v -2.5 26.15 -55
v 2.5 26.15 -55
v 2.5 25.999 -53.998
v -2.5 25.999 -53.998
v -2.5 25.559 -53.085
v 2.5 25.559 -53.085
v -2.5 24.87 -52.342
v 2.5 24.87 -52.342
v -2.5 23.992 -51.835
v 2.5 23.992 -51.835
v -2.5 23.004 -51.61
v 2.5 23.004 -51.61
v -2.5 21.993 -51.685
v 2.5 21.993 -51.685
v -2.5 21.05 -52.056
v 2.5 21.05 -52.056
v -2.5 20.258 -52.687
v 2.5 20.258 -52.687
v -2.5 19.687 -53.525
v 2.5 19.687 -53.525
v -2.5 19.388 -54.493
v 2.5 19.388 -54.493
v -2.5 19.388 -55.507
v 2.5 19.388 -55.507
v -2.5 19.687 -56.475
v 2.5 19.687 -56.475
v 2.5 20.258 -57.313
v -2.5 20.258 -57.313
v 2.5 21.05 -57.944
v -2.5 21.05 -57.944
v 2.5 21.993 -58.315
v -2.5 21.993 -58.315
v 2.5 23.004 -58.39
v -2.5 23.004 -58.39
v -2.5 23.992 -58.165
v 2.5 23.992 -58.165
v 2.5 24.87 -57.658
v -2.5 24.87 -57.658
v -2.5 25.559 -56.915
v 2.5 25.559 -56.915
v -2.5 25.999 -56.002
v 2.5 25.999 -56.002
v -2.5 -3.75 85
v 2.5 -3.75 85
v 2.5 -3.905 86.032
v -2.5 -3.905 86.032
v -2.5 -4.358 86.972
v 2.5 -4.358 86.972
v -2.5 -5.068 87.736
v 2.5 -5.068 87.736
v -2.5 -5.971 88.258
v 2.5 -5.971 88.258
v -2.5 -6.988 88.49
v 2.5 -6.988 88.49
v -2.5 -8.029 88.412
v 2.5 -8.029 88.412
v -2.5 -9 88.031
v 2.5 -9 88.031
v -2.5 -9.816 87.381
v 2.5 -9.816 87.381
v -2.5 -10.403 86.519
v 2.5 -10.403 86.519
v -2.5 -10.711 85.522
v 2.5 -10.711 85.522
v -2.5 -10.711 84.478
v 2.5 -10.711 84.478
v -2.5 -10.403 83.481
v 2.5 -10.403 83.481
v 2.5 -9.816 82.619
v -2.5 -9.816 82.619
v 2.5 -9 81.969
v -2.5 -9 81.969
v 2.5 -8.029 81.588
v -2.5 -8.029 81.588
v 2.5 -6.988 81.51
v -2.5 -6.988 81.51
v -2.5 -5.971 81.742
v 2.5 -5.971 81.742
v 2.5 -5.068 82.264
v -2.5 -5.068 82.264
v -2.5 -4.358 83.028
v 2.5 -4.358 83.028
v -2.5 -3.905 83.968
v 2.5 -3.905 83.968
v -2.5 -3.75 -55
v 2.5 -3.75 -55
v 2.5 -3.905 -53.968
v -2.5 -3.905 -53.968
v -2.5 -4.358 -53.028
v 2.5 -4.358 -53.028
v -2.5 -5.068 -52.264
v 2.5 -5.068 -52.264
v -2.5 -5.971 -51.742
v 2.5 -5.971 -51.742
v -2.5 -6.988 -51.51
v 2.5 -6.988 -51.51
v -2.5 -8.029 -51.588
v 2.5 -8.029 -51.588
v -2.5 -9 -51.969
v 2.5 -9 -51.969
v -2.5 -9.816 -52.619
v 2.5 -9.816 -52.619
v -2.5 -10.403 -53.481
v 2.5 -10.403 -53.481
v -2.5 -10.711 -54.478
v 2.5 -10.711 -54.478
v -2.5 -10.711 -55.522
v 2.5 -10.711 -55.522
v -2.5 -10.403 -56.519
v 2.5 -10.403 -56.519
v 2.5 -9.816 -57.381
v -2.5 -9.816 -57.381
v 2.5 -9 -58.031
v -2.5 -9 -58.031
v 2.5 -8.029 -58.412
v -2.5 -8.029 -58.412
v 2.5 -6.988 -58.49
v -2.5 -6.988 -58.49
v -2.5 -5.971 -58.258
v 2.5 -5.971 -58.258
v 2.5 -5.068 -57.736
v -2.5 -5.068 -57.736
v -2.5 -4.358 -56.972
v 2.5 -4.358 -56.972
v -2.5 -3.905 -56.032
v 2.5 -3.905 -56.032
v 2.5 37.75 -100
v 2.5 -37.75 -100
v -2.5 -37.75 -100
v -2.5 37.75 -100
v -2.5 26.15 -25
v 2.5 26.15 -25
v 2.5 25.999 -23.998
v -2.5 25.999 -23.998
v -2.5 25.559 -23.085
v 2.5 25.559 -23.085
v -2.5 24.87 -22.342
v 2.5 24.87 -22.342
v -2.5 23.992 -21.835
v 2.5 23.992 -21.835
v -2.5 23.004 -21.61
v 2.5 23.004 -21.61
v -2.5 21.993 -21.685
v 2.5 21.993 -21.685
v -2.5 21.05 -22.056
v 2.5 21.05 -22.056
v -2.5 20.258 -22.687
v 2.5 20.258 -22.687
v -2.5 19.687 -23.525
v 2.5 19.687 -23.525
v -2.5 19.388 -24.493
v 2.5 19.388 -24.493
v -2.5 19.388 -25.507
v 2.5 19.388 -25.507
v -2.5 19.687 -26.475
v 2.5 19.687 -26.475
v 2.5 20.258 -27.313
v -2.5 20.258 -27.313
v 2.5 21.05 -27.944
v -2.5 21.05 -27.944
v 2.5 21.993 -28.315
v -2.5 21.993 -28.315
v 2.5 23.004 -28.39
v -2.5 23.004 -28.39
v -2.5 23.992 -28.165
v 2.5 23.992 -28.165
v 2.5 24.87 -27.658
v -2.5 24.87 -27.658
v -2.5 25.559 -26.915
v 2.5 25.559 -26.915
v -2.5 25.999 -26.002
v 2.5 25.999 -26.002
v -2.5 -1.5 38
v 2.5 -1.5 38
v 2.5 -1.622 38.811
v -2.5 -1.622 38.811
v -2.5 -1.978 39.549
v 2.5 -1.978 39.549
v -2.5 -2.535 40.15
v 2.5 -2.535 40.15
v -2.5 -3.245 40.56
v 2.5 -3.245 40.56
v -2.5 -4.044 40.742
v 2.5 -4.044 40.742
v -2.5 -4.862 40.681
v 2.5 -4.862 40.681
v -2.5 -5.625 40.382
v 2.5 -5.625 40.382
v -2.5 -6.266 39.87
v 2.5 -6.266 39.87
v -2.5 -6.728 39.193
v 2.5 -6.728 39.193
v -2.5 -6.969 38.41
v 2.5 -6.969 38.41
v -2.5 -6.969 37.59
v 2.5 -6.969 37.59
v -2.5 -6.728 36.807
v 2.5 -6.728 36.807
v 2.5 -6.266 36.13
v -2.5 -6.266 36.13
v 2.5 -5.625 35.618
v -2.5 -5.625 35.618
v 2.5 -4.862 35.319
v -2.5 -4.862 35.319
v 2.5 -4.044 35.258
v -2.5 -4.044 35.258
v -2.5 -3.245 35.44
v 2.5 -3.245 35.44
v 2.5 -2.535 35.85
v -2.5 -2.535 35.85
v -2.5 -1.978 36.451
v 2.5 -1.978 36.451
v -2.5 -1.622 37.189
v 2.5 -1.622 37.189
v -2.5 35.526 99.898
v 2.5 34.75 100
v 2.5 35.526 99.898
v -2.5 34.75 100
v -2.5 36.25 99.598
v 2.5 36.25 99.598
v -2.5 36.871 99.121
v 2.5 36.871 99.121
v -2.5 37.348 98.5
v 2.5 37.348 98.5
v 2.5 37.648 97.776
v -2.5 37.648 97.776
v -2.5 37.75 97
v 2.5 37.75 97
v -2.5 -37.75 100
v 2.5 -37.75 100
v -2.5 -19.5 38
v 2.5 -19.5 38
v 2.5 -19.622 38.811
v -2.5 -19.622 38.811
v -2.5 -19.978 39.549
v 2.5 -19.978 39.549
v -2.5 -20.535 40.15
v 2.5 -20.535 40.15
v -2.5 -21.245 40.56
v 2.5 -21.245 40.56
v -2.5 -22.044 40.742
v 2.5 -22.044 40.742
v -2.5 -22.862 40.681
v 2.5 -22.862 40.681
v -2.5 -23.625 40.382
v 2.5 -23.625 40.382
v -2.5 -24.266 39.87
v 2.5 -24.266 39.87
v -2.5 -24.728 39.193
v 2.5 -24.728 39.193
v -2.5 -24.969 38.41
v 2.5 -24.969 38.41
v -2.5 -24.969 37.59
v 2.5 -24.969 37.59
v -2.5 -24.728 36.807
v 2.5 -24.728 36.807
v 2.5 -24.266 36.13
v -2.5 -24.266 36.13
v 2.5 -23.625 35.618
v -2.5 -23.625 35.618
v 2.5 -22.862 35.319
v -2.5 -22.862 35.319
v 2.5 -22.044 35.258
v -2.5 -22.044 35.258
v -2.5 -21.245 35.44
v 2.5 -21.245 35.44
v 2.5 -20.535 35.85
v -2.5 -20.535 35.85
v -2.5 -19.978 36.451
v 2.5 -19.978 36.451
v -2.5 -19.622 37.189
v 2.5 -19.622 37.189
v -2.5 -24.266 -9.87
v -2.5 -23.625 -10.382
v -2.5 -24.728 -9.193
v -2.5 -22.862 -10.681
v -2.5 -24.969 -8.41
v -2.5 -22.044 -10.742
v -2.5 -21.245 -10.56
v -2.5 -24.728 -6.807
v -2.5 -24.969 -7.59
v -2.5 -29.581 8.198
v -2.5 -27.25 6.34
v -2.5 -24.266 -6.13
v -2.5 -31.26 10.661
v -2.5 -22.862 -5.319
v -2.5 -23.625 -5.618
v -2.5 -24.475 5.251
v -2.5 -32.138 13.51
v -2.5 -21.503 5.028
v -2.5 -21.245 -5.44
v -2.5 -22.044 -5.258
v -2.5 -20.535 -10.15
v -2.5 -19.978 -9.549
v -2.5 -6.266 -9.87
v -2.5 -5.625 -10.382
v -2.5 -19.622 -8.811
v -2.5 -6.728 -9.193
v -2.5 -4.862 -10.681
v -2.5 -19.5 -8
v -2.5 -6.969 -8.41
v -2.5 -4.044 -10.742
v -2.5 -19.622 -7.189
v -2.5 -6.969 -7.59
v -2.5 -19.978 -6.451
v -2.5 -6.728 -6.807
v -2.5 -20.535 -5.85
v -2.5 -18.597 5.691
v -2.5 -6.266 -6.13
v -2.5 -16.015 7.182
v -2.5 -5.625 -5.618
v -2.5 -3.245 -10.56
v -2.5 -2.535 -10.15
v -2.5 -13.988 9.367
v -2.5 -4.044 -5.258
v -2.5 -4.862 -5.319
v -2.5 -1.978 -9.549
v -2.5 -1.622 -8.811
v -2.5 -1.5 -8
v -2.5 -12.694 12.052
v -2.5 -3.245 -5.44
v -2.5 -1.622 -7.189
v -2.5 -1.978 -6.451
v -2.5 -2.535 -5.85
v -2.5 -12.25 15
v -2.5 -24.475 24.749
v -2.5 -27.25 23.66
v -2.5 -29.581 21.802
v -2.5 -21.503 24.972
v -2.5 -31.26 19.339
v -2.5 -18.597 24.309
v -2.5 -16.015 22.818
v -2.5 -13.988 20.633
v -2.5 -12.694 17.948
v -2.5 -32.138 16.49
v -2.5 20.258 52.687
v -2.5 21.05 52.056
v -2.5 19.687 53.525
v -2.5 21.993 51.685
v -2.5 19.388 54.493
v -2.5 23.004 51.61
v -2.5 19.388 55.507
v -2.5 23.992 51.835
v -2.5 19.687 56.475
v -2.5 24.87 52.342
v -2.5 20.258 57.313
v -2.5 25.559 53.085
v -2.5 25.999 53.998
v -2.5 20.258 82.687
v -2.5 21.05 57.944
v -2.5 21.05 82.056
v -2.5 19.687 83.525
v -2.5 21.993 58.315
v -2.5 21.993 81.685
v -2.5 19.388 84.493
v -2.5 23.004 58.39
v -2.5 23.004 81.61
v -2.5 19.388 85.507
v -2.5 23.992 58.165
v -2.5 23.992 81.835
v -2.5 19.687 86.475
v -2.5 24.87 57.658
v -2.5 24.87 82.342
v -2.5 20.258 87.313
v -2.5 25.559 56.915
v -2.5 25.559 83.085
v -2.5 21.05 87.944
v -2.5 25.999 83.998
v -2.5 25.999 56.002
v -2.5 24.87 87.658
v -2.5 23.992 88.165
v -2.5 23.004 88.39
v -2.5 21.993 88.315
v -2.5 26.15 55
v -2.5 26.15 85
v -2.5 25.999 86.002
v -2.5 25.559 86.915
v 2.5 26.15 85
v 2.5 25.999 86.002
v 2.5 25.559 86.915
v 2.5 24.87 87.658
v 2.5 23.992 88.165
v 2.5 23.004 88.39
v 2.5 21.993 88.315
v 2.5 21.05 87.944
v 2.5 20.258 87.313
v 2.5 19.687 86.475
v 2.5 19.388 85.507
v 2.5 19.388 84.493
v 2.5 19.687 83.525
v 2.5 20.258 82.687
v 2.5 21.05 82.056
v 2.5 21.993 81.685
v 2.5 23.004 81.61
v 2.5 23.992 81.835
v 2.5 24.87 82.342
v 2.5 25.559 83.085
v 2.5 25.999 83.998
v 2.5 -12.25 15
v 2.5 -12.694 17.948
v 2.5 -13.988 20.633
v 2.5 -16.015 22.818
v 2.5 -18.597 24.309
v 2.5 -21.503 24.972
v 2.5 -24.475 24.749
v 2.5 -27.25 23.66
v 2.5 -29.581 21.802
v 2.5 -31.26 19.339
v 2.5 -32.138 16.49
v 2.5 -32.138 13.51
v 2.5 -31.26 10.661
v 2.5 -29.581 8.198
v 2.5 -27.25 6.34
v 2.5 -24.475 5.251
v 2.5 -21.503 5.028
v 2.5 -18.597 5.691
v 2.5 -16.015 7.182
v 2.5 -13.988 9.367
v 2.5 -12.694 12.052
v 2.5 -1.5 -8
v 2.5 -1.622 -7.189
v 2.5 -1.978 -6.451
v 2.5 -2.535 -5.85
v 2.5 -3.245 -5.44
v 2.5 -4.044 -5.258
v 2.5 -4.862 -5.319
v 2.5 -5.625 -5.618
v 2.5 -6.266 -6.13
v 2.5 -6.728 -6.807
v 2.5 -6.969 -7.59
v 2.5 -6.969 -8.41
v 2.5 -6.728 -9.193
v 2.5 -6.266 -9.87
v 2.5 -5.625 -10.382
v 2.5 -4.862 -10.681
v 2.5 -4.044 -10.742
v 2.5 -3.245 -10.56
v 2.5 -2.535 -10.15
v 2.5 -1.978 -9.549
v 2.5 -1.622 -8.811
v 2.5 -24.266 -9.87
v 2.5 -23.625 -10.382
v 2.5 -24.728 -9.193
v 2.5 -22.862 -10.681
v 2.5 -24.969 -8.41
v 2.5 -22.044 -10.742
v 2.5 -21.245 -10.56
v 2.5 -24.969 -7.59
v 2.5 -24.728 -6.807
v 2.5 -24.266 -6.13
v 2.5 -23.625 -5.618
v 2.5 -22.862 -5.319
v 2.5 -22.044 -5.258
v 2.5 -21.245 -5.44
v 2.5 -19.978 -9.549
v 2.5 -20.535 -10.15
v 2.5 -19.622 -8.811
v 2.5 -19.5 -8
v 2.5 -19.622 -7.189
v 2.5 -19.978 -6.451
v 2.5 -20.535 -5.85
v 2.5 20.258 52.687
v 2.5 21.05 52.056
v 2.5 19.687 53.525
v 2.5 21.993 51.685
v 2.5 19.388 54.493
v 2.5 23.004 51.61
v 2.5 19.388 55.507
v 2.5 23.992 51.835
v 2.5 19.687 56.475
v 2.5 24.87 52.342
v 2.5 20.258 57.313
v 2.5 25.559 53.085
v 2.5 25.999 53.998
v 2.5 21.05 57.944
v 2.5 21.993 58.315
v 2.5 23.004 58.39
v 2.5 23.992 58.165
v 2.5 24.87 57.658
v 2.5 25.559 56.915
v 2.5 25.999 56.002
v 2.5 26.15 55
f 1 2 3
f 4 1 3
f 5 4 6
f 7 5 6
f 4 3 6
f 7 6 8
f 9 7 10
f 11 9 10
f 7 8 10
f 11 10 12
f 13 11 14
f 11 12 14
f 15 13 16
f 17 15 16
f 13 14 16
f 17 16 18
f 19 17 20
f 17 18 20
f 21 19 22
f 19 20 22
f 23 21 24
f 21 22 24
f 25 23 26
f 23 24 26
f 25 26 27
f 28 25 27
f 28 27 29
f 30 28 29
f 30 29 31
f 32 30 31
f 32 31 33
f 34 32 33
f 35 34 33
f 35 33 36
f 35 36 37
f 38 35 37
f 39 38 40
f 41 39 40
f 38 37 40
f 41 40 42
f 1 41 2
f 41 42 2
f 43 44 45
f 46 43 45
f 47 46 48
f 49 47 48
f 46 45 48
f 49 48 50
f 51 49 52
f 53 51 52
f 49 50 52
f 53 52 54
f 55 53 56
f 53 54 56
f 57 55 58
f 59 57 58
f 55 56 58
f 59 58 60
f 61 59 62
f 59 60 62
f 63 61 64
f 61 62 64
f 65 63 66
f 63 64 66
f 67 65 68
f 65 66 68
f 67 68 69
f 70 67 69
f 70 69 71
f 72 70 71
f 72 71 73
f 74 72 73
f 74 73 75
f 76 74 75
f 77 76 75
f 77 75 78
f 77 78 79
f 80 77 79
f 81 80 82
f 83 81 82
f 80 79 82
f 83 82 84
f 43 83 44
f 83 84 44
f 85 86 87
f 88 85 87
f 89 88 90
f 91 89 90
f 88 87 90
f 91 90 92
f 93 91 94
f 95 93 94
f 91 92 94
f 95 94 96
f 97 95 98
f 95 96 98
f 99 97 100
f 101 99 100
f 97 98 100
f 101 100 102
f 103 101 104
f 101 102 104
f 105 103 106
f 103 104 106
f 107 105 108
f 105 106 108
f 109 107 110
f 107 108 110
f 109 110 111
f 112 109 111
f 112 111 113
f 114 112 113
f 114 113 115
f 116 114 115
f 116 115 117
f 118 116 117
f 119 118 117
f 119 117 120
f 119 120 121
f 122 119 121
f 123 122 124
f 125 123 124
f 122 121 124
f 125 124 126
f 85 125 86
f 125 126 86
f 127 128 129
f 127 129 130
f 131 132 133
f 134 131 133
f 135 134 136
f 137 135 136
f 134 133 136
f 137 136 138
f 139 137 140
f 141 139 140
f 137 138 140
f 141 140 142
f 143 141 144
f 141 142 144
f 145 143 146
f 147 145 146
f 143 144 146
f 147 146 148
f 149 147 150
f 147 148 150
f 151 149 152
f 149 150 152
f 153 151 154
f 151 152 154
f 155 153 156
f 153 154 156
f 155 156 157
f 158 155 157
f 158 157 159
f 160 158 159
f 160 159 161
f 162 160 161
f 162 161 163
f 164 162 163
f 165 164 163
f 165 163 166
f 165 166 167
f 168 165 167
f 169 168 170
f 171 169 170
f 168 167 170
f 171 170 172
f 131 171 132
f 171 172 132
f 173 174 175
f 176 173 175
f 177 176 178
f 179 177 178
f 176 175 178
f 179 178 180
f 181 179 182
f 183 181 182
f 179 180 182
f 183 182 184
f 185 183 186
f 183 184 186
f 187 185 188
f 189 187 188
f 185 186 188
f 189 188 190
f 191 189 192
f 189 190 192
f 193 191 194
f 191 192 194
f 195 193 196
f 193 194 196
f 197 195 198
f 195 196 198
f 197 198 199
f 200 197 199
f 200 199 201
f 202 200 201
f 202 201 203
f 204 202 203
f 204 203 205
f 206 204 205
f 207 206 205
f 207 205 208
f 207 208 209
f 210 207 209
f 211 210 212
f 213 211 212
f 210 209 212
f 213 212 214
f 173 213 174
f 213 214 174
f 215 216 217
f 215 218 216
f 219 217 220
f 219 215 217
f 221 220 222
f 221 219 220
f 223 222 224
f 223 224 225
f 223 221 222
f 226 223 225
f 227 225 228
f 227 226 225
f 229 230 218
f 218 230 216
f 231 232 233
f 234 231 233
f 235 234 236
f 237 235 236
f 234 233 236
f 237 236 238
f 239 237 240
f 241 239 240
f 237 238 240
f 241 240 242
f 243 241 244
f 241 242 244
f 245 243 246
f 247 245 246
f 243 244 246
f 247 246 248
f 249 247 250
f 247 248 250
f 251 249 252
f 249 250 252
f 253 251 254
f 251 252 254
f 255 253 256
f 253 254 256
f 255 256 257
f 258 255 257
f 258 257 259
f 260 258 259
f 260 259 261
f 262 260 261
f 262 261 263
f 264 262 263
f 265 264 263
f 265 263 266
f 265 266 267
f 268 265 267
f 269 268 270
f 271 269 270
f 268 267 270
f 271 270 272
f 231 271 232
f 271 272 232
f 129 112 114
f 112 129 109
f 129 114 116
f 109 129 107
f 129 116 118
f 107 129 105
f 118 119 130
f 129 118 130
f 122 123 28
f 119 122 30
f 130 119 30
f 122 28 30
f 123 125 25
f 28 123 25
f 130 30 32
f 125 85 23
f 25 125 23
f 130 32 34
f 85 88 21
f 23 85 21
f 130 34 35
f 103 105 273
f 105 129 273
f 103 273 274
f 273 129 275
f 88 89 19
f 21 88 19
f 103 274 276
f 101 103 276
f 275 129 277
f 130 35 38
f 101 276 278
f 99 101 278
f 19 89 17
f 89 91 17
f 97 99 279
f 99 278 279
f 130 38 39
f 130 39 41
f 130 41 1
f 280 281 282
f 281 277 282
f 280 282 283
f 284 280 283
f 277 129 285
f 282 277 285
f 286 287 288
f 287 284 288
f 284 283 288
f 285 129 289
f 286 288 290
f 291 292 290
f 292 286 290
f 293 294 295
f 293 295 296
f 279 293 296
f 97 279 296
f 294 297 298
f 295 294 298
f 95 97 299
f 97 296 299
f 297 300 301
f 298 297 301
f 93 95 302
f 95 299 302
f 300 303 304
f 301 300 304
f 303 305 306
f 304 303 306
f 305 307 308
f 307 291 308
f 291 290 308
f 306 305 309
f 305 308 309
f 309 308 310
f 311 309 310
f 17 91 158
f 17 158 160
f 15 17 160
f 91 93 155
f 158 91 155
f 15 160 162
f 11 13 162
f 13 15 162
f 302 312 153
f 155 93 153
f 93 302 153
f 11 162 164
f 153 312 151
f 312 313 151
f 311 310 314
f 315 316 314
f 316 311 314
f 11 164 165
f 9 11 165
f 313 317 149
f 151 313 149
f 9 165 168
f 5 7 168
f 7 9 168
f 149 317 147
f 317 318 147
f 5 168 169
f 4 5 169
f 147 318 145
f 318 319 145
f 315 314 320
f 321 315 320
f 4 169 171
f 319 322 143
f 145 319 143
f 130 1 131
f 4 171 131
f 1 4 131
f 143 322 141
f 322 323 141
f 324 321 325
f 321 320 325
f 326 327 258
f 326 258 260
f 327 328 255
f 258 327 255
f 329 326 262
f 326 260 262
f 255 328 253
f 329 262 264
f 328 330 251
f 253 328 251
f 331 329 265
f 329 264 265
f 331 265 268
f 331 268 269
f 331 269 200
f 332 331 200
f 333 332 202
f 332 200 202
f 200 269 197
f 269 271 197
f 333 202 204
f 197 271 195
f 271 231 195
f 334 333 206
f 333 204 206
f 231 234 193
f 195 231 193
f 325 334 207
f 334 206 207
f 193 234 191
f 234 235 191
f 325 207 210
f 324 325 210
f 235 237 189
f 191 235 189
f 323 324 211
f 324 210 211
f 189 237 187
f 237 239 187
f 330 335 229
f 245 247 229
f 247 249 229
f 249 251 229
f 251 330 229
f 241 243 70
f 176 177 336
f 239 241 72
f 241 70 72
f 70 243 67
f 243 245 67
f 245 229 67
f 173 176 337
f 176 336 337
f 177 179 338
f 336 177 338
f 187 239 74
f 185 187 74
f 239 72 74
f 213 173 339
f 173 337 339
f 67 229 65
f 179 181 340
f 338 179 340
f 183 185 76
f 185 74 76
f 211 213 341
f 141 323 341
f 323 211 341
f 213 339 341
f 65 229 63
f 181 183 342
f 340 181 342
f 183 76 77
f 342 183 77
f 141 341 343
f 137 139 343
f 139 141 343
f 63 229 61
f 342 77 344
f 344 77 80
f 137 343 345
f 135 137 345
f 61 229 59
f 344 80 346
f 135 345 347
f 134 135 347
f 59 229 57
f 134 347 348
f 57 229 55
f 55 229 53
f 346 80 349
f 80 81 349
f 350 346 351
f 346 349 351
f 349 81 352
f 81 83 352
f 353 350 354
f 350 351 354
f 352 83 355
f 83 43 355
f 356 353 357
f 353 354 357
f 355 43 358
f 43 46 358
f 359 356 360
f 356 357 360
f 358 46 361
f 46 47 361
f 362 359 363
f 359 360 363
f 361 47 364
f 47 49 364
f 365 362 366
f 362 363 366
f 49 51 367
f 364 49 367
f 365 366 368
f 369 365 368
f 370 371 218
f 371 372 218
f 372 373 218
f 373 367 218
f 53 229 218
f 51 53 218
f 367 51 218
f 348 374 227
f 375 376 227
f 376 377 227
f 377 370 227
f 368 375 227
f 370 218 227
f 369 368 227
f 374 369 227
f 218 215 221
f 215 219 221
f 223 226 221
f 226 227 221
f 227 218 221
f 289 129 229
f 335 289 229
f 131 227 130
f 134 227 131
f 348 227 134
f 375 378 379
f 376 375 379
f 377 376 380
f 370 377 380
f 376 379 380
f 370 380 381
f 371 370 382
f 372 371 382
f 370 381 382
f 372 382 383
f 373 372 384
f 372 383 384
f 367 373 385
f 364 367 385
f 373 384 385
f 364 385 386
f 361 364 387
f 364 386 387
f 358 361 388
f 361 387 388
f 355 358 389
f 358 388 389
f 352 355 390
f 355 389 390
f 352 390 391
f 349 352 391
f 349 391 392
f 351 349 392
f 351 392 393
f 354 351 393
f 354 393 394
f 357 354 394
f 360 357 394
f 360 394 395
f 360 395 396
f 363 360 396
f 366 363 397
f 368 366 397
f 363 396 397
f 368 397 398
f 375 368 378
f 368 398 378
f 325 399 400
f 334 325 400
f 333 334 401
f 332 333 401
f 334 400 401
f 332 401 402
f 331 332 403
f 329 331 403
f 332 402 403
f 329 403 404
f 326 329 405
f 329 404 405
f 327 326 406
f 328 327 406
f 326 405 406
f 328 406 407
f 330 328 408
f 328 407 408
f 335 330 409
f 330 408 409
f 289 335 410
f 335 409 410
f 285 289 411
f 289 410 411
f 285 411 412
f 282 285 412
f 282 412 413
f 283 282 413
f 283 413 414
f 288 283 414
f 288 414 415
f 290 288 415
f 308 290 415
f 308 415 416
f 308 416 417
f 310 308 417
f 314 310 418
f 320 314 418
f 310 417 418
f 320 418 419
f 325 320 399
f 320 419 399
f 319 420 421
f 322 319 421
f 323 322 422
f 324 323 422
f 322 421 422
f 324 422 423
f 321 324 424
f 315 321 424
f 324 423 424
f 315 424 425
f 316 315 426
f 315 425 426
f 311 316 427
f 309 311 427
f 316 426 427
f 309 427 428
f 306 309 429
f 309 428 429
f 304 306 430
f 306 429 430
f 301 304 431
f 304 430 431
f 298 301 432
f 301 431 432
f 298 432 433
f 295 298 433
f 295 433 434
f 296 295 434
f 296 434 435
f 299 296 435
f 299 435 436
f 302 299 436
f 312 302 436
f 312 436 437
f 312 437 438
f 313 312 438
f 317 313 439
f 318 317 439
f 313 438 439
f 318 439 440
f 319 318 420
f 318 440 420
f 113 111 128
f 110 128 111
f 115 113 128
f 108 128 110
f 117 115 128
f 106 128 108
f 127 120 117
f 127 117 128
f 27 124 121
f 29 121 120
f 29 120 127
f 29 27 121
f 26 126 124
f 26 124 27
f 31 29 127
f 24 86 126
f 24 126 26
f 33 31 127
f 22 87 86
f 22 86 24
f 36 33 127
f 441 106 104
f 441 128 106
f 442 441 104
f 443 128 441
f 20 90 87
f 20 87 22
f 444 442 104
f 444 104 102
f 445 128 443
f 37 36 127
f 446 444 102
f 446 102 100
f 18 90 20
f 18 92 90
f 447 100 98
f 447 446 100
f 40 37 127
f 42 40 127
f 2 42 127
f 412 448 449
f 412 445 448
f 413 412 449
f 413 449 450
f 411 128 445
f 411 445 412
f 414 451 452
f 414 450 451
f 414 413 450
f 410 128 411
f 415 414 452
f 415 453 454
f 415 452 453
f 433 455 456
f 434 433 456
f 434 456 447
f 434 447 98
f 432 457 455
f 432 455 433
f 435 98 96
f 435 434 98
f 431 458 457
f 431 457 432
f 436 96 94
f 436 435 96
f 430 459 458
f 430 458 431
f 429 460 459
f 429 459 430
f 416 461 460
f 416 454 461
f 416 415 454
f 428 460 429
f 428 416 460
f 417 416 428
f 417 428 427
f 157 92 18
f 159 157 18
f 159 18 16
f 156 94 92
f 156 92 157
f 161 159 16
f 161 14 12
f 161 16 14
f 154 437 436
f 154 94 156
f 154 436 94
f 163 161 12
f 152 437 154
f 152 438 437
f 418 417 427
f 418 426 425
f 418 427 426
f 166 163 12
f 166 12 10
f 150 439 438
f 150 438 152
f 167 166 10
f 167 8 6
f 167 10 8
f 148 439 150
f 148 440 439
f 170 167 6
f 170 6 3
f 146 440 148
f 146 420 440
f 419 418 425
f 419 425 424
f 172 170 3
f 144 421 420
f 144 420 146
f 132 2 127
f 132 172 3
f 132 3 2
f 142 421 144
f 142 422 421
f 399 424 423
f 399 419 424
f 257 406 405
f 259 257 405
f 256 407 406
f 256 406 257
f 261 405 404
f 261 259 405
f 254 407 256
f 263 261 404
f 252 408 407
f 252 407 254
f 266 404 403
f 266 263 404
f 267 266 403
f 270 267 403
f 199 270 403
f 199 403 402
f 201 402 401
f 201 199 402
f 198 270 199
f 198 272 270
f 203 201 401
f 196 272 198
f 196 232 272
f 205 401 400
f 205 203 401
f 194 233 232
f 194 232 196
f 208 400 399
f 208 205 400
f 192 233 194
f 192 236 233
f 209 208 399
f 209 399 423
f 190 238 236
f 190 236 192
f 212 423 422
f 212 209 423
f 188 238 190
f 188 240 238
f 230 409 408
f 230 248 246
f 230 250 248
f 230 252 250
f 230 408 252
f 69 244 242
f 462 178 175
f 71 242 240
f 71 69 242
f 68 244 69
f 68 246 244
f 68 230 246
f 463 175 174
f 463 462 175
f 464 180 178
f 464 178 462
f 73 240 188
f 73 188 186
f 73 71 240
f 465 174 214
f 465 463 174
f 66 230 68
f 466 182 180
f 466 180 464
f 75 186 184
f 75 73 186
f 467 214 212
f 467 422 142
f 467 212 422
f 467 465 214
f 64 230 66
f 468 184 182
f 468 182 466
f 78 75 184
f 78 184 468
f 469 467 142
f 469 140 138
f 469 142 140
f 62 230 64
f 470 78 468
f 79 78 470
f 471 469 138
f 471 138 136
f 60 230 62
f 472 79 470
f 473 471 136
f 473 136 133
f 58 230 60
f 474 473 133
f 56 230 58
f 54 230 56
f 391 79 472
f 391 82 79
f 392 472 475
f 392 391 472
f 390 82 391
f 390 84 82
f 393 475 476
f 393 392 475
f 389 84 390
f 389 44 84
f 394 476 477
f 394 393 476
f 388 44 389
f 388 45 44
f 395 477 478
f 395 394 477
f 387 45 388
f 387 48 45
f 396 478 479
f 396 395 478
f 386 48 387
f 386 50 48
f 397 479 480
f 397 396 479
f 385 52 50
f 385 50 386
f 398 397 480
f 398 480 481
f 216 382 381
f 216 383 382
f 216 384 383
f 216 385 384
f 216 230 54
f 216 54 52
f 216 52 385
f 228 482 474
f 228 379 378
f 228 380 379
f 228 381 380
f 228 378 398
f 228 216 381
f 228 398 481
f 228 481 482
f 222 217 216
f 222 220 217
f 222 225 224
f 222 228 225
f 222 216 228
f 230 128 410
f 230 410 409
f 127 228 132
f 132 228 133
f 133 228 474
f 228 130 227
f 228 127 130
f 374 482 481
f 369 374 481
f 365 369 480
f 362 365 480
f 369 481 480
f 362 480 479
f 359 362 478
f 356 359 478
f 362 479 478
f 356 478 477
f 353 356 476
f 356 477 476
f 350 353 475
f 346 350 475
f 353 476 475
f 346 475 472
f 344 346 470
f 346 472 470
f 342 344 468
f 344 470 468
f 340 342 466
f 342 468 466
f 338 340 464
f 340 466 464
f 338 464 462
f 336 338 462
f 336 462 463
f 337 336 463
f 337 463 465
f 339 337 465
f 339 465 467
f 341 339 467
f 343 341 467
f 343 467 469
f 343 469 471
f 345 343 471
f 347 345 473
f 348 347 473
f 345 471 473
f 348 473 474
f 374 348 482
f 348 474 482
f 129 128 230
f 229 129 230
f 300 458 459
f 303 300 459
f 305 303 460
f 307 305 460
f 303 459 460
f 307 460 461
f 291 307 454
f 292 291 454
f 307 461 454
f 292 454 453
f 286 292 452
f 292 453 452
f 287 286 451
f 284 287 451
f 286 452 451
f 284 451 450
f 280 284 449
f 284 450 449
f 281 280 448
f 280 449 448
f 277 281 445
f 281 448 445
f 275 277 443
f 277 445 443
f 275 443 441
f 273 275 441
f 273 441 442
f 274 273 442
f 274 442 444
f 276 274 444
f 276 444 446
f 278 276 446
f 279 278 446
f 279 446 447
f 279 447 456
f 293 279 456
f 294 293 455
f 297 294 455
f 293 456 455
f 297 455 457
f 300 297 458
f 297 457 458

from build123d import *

# Parameters (mm, degrees)
F0_W     = 75.5
F0_H     = 200
F1_DEPTH = 2.5
F2_R     = 3.4
F2_R_2   = 3.5
F2_R_3   = 10
F2_R_4   = 2.75
F3_DEPTH = 5
F4_R     = 3


with BuildPart() as f1:
    # F0 (on Right) → F1 (new body, symmetric)
    with BuildSketch(Plane.YZ):
        Rectangle(F0_W, F0_H)
    extrude(amount=F1_DEPTH, both=True)

    # F2 (on face) → F3 (cut)
    with BuildSketch(Plane.YZ.offset(2.5)):
        with Locations((22.75, 85)):
            Circle(F2_R)
        with Locations((22.75, 55)):
            Circle(F2_R)
        with Locations((22.75, -55)):
            Circle(F2_R)
        with Locations((22.75, -25)):
            Circle(F2_R)
        with Locations((-7.25, 85)):
            Circle(F2_R_2)
        with Locations((-7.25, -55)):
            Circle(F2_R_2)
        with Locations((-22.25, 15)):
            Circle(F2_R_3)
        with Locations((-22.25, 38)):
            Circle(F2_R_4)
        with Locations((-4.25, 38)):
            Circle(F2_R_4)
        with Locations((-22.25, -8)):
            Circle(F2_R_4)
        with Locations((-4.25, -8)):
            Circle(F2_R_4)
    extrude(amount=-F3_DEPTH, mode=Mode.SUBTRACT)

    # F4
    f4_edges = [f1.edges().sort_by_distance(p)[0] for p in [
        (0, 37.75, 100),
    ]]
    fillet(f4_edges, radius=F4_R)


solid = f1.part
